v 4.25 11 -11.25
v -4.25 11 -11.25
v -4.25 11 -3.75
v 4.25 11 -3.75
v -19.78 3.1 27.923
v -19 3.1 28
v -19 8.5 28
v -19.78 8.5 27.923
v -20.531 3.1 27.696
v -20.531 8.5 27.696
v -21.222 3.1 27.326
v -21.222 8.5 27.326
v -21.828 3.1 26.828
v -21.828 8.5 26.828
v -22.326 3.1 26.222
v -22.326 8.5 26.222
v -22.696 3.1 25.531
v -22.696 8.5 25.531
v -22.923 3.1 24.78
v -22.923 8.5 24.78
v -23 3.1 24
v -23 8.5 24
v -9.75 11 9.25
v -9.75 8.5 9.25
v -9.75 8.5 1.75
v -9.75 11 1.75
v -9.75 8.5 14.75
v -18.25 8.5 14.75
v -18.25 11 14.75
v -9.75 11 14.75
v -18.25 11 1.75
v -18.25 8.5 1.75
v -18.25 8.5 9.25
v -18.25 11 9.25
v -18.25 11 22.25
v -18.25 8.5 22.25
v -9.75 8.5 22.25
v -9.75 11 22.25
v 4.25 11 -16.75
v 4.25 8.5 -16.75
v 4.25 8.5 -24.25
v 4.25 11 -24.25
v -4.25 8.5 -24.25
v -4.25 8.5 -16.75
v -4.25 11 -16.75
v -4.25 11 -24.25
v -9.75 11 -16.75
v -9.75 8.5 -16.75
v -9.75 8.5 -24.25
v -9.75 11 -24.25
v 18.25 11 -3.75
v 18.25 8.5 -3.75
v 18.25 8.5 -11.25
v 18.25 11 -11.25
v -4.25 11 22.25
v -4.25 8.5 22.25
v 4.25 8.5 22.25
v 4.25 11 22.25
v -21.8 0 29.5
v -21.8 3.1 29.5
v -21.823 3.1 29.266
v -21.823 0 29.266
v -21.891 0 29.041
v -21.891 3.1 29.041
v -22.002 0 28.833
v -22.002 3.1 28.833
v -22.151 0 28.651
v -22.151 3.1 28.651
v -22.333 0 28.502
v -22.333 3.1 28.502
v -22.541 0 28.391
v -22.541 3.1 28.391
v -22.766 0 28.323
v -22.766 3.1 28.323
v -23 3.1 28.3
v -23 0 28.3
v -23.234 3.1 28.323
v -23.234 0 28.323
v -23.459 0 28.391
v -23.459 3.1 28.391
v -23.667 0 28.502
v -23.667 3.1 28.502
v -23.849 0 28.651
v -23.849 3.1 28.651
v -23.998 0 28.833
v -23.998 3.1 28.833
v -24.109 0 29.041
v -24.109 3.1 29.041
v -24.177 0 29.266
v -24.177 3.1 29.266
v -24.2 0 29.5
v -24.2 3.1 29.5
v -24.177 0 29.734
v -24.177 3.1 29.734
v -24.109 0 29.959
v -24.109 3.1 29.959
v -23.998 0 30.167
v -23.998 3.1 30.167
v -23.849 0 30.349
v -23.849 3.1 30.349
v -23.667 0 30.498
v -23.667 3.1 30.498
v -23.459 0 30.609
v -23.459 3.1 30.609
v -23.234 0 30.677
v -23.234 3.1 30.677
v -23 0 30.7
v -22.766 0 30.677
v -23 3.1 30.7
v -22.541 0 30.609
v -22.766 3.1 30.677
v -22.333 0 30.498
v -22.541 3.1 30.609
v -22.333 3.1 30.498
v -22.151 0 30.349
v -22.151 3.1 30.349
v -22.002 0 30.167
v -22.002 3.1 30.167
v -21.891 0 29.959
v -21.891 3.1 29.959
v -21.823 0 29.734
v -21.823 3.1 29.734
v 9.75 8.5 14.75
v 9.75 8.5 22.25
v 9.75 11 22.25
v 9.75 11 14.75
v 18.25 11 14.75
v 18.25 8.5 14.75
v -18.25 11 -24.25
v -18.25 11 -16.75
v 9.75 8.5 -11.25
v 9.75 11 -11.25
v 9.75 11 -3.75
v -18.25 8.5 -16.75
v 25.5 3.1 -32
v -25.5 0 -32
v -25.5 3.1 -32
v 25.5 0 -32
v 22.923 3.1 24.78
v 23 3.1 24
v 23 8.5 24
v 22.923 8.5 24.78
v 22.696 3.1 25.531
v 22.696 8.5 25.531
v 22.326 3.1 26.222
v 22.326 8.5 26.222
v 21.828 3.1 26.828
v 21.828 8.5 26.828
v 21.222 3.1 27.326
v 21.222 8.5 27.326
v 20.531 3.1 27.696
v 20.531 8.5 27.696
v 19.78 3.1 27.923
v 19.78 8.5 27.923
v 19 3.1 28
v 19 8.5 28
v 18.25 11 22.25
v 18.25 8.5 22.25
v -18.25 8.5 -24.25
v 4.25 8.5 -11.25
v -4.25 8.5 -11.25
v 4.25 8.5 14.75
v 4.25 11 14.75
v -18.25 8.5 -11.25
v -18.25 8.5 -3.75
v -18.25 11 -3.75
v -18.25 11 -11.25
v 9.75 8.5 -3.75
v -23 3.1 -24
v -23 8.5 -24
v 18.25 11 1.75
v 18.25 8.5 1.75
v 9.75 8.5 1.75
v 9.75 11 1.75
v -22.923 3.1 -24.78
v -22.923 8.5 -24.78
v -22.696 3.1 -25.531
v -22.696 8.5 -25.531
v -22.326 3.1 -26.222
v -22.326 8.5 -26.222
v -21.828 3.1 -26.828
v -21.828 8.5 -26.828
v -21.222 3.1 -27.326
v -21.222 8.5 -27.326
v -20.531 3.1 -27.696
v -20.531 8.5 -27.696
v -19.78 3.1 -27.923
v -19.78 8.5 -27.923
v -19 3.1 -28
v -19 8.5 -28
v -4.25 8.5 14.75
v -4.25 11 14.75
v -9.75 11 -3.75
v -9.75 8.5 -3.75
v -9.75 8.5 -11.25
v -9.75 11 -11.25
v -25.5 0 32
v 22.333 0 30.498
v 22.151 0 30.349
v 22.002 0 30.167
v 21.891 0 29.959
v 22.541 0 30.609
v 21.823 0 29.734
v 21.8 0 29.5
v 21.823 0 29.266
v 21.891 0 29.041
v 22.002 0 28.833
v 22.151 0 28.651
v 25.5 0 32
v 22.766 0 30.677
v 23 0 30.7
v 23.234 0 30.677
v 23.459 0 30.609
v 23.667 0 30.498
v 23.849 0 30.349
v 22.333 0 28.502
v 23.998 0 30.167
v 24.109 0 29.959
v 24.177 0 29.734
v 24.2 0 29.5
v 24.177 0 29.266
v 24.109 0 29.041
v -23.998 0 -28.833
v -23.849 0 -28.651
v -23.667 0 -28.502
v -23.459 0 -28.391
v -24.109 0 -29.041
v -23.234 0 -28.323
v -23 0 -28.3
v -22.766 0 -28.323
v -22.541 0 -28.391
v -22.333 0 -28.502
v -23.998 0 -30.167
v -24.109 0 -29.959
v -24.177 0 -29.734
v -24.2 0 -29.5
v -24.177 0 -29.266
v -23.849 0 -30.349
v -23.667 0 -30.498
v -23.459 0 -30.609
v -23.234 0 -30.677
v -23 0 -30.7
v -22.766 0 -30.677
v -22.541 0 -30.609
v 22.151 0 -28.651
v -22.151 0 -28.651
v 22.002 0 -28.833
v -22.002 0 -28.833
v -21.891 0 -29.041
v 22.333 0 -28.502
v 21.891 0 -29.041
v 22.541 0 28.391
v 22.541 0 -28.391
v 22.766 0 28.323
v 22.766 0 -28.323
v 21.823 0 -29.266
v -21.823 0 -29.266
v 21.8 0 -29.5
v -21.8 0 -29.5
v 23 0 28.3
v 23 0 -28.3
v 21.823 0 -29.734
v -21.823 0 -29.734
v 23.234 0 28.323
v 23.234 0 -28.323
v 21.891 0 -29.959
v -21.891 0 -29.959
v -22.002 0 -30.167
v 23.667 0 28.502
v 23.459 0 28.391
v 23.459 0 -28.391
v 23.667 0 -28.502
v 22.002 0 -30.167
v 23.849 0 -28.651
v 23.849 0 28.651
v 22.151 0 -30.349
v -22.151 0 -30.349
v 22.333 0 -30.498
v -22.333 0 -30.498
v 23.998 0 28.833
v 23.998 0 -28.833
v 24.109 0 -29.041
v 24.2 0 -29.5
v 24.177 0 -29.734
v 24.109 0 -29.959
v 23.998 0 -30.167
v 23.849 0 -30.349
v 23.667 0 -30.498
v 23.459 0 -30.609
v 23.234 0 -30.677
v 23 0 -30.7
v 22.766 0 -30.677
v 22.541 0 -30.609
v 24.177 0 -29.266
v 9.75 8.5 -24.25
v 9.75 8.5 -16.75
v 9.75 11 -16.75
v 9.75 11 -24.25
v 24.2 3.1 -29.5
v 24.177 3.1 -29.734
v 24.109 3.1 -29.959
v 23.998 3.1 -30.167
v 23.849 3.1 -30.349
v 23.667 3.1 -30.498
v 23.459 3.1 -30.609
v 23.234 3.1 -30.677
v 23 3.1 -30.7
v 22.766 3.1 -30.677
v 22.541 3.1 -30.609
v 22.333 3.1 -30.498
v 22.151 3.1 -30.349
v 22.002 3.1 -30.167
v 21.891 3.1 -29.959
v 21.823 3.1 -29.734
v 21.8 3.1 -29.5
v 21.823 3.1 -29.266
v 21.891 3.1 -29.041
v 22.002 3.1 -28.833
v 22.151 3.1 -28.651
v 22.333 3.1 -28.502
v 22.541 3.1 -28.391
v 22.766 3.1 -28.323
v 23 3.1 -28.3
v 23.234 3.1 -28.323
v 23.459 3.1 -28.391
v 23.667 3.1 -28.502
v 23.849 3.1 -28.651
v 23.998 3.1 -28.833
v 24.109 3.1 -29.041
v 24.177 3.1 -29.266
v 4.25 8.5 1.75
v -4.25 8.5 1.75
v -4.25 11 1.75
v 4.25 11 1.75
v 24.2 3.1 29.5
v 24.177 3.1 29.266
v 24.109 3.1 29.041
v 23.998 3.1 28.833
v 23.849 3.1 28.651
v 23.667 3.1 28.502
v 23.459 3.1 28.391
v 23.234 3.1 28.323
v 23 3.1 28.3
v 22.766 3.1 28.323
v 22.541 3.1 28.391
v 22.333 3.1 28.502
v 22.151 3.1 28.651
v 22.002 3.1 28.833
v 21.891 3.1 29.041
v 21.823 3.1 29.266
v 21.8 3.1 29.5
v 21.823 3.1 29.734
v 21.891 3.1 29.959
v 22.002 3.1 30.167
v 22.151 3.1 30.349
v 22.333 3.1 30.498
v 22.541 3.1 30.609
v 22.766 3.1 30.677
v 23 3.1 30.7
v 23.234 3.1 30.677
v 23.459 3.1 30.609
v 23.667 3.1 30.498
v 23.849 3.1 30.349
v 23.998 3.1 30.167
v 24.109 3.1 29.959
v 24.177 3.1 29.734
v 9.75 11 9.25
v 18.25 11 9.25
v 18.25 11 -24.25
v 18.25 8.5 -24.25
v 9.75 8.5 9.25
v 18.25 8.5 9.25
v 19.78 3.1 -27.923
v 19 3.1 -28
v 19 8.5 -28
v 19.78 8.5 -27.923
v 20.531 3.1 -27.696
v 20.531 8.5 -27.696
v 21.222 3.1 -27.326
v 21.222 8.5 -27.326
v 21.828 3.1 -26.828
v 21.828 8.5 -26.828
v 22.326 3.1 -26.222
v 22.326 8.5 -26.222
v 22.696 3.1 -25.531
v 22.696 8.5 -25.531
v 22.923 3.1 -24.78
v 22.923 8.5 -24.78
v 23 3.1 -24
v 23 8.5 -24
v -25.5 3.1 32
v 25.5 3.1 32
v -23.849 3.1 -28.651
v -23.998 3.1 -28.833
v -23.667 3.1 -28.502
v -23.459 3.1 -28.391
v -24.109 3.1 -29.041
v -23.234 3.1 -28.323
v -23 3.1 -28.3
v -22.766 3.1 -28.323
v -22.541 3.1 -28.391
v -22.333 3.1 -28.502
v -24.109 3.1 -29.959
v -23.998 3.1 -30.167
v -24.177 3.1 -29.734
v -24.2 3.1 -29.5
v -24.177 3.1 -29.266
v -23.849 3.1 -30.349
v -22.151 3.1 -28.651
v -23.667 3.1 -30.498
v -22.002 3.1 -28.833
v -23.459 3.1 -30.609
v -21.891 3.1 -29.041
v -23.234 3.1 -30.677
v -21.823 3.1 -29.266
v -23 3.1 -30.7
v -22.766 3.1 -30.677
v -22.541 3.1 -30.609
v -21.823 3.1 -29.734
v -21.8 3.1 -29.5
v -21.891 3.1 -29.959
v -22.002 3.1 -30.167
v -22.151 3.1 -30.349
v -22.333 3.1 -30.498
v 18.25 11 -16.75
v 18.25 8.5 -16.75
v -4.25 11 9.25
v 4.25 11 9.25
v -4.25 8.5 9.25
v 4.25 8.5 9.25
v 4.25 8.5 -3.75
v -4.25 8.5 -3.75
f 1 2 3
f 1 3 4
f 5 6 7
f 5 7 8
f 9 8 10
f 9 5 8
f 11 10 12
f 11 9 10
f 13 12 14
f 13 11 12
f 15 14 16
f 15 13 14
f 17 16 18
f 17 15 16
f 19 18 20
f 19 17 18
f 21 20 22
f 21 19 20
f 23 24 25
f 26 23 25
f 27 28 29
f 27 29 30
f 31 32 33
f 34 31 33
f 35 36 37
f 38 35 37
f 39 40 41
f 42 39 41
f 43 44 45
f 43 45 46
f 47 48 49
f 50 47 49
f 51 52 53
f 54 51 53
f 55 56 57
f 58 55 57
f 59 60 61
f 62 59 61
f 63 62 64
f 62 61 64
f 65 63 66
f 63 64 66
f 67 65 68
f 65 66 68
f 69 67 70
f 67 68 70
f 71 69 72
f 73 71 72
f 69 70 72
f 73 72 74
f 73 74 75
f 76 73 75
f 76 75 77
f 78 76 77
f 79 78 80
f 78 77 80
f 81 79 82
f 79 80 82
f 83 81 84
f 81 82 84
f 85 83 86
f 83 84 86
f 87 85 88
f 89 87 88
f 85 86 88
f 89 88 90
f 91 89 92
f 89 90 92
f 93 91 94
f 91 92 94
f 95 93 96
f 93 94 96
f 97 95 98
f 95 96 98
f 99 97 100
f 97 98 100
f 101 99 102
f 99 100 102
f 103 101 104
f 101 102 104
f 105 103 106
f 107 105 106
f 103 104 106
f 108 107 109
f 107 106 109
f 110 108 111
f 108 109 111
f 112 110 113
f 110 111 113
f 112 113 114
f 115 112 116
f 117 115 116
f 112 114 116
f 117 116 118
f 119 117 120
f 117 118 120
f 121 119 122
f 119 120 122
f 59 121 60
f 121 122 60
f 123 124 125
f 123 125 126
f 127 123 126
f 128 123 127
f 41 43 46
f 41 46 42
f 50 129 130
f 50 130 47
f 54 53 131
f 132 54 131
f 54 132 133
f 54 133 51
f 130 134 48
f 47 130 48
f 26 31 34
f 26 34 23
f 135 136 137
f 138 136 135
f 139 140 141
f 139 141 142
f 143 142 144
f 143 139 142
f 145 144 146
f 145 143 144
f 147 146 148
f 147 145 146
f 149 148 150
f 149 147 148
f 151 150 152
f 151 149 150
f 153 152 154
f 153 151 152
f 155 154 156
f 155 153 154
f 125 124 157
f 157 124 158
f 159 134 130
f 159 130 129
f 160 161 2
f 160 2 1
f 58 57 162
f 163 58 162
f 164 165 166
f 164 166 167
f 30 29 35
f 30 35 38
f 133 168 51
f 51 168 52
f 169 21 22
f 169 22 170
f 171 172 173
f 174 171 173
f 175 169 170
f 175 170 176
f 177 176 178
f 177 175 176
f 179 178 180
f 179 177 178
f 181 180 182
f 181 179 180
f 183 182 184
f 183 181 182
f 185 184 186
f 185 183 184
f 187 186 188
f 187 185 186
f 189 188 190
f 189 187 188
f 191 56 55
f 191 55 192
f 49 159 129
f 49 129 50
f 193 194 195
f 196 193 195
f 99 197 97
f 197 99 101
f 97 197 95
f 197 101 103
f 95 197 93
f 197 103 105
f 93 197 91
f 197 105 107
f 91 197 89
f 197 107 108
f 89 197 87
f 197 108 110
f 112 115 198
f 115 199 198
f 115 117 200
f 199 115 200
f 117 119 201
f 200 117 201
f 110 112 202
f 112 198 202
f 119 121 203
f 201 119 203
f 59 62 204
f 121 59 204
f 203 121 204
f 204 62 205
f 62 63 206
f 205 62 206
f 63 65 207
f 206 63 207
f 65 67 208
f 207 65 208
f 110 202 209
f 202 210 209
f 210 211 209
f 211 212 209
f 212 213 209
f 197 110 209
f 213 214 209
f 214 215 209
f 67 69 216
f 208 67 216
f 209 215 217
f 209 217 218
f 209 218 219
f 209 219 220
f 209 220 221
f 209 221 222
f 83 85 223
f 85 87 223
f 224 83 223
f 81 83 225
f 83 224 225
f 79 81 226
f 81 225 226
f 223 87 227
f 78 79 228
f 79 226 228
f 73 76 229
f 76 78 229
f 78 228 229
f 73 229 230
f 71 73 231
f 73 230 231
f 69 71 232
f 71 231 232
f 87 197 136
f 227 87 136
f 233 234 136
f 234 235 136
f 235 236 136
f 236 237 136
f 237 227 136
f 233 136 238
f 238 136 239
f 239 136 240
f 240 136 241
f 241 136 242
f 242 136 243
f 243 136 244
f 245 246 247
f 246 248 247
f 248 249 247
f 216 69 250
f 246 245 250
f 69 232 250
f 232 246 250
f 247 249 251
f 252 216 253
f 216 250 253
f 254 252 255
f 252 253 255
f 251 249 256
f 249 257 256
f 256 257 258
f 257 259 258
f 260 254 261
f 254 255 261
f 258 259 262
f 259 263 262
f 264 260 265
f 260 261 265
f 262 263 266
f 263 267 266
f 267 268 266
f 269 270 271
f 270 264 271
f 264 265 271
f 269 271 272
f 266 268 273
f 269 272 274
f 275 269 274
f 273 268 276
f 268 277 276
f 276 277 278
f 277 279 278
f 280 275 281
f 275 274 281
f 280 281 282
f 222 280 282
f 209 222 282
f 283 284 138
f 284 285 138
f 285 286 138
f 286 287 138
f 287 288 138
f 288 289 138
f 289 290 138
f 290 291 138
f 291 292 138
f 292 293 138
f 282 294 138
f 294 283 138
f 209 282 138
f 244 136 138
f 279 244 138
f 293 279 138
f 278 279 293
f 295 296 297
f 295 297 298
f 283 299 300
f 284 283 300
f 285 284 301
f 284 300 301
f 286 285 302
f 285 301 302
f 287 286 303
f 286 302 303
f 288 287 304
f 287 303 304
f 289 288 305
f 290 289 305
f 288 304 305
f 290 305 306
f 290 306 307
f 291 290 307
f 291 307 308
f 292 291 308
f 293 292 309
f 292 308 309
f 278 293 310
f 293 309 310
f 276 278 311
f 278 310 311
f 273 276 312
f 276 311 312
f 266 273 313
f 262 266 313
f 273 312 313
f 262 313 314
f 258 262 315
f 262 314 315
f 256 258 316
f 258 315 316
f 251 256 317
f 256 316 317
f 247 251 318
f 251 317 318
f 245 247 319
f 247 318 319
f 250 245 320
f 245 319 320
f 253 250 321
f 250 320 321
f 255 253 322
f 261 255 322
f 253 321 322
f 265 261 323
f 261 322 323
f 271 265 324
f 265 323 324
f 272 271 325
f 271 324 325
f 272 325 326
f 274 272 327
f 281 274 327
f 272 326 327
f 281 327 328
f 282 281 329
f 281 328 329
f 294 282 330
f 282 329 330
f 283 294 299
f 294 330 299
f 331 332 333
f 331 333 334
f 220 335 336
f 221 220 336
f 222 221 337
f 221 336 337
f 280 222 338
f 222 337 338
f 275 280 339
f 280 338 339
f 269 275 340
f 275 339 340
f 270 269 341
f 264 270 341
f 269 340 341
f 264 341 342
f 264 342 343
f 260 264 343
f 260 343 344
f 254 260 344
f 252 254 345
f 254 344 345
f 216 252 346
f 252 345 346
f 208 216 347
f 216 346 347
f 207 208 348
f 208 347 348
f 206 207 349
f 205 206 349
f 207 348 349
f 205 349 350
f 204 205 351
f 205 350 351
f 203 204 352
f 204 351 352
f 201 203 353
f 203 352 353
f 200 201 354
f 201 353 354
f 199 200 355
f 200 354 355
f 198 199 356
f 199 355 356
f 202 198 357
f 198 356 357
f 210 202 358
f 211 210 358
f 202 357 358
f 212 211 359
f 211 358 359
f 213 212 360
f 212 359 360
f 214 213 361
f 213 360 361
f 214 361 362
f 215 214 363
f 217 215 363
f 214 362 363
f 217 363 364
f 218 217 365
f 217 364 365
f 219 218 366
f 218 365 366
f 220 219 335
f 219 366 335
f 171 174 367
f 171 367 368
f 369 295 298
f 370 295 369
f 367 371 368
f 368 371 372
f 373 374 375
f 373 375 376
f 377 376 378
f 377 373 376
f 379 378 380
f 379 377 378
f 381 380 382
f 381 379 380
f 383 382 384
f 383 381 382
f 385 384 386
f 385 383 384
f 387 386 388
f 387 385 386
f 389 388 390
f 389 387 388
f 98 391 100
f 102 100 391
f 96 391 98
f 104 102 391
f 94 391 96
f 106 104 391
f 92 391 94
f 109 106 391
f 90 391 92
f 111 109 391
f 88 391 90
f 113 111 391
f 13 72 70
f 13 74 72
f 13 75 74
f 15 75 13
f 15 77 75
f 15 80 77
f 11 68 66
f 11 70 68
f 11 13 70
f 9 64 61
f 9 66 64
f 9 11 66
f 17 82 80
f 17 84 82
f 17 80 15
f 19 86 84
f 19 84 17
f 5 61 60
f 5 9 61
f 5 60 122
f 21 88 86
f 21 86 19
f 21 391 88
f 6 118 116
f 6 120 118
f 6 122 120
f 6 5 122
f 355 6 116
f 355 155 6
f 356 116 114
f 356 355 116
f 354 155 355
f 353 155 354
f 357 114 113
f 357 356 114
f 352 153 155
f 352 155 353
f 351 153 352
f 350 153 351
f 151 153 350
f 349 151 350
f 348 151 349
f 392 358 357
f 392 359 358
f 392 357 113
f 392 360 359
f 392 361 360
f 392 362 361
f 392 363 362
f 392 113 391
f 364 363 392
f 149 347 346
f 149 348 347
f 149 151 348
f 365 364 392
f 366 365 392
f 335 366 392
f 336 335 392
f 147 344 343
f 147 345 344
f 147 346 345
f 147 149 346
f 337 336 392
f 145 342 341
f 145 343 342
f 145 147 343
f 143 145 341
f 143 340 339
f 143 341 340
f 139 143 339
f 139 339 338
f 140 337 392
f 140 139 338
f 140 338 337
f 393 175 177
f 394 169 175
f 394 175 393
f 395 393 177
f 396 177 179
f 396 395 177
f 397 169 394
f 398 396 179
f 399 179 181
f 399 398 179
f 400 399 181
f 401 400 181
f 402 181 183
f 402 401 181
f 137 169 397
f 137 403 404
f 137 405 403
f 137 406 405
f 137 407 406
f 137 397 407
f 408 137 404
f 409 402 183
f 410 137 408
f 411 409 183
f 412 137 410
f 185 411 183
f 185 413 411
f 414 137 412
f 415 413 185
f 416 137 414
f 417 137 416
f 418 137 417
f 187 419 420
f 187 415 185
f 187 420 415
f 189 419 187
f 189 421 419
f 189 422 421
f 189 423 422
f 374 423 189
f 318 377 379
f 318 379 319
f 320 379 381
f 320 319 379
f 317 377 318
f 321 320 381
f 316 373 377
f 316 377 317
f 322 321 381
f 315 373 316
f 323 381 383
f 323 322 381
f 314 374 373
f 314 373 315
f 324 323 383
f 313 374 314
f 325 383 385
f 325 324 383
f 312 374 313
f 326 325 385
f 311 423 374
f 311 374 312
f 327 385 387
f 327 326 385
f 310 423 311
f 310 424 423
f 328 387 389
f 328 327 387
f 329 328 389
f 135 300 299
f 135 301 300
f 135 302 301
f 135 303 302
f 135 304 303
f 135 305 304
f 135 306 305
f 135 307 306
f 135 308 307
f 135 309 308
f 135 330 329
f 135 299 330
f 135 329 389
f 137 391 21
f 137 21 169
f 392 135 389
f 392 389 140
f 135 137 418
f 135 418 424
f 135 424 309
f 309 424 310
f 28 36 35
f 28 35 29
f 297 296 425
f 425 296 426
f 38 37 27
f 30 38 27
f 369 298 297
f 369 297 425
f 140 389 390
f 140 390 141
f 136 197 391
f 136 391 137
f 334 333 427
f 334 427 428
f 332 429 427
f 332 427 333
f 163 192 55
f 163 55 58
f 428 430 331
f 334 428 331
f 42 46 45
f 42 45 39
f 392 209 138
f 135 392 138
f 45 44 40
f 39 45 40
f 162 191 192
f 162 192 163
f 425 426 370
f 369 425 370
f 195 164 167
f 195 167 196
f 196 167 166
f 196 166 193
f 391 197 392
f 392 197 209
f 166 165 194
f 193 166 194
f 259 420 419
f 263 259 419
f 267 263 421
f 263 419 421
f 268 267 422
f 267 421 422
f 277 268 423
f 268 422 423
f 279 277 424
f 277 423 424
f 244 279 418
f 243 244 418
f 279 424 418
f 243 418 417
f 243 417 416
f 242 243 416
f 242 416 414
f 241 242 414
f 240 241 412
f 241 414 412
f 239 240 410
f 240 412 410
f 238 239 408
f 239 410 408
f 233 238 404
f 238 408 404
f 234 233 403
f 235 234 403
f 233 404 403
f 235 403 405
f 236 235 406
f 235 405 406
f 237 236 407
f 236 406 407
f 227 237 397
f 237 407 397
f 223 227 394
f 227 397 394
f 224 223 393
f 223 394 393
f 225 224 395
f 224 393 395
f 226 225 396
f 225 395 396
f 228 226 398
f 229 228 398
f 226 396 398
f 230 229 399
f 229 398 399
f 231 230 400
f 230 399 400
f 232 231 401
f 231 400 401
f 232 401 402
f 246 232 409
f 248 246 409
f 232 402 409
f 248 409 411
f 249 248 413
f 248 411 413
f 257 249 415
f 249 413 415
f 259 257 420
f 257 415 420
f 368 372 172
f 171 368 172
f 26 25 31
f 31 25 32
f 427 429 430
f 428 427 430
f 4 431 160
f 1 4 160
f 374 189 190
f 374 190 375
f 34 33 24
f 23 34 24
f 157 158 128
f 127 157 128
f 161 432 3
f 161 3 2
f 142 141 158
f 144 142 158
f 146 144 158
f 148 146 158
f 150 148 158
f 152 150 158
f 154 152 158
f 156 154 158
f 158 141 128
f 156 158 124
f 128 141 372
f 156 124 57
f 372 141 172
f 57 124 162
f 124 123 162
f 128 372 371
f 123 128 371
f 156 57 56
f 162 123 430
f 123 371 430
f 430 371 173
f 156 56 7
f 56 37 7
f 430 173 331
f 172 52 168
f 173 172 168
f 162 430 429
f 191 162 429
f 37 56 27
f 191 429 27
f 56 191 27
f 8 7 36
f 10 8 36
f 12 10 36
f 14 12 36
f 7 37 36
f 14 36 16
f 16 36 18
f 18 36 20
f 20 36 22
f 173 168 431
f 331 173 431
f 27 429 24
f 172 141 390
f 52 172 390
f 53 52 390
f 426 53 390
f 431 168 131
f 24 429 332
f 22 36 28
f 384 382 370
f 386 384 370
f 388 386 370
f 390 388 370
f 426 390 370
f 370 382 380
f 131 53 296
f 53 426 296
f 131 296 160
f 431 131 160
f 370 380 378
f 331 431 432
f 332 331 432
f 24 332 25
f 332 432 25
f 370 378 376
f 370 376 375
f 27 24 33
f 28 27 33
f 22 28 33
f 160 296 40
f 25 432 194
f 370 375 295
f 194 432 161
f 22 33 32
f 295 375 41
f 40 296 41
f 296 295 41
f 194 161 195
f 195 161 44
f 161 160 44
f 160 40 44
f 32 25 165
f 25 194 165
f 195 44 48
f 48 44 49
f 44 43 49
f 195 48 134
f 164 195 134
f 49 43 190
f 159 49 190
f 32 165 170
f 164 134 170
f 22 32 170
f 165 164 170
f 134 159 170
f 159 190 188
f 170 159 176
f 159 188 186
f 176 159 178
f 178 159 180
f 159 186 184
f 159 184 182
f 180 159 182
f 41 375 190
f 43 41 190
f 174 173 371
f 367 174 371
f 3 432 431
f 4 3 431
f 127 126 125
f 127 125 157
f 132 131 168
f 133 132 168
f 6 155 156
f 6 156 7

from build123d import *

# Parameters (mm, degrees)
SKETCH1_W           = 51
SKETCH1_H           = 64
BOSS_EXTRUDE1_DEPTH = 3.1
SKETCH2_R           = 1.2
CUT_EXTRUDE1_DEPTH  = 3.1
BOSS_EXTRUDE2_DEPTH = 5.4
SKETCH4_W           = 8.5
SKETCH4_H           = 7.5
BOSS_EXTRUDE4_DEPTH = 2.5


with BuildPart() as part:
    # Sketch1 → Boss-Extrude1 (new body)
    with BuildSketch(Plane(origin=(0, 0, 0), x_dir=(1, 0, 0), z_dir=(0, 1, 0))):
        Rectangle(SKETCH1_W, SKETCH1_H)
    extrude(amount=BOSS_EXTRUDE1_DEPTH)

    # Sketch2 → Cut-Extrude1 (cut)
    with BuildSketch(Plane(origin=(0, 3.1, 0), x_dir=(1, 0, 0), z_dir=(0, 1, 0))):
        with Locations((-23, 29.5)):
            Circle(SKETCH2_R)
        with Locations((23, 29.5)):
            Circle(SKETCH2_R)
        with Locations((23, -29.5)):
            Circle(SKETCH2_R)
        with Locations((-23, -29.5)):
            Circle(SKETCH2_R)
    extrude(amount=-CUT_EXTRUDE1_DEPTH, mode=Mode.SUBTRACT)

    # Sketch3 → Boss-Extrude2 (add)
    with BuildSketch(Plane(origin=(0, 3.1, 0), x_dir=(1, 0, 0), z_dir=(0, 1, 0))):
        with BuildLine():
            Line((-19, 28), (19, 28))
            ThreePointArc((19, 28), (21.828427125, 26.828427125), (23, 24))
            Line((23, 24), (23, -24))
            ThreePointArc((23, -24), (21.828427125, -26.828427125), (19, -28))
            Line((19, -28), (-19, -28))
            ThreePointArc((-19, -28), (-21.828427125, -26.828427125), (-23, -24))
            Line((-23, -24), (-23, 24))
            ThreePointArc((-23, 24), (-21.828427125, 26.828427125), (-19, 28))
        make_face()
    extrude(amount=BOSS_EXTRUDE2_DEPTH)

    # Sketch4 → Boss-Extrude4 (add)
    with BuildSketch(Plane(origin=(0, 8.5, 0), x_dir=(1, 0, 0), z_dir=(0, 1, 0))):
        with Locations((-14, 20.5)):
            Rectangle(SKETCH4_W, SKETCH4_H)
        with Locations((0, 20.5)):
            Rectangle(SKETCH4_W, SKETCH4_H)
        with Locations((14, 20.5)):
            Rectangle(SKETCH4_W, SKETCH4_H)
        Polygon((9.75, 11.25), (9.75, 3.75), (18.25, 3.75), (18.25, 11.25), (14, 11.25), align=None)
        with Locations((0, 7.5)):
            Rectangle(SKETCH4_W, SKETCH4_H)
        with Locations((-14, 7.5)):
            Rectangle(SKETCH4_W, SKETCH4_H)
        Polygon((-18.25, -1.75), (-18.25, -5.5), (-18.25, -9.25), (-9.75, -9.25), (-9.75, -1.75), align=None)
        with Locations((0, -5.5)):
            Rectangle(SKETCH4_W, SKETCH4_H)
        Polygon((18.25, -9.25), (18.25, -5.5), (18.25, -1.75), (9.75, -1.75), (9.75, -9.25), align=None)
        with Locations((14, -18.5)):
            Rectangle(SKETCH4_W, SKETCH4_H)
        with Locations((0, -18.5)):
            Rectangle(SKETCH4_W, SKETCH4_H)
        with Locations((-14, -18.5)):
            Rectangle(SKETCH4_W, SKETCH4_H)
    extrude(amount=BOSS_EXTRUDE4_DEPTH)


solid = part.part
